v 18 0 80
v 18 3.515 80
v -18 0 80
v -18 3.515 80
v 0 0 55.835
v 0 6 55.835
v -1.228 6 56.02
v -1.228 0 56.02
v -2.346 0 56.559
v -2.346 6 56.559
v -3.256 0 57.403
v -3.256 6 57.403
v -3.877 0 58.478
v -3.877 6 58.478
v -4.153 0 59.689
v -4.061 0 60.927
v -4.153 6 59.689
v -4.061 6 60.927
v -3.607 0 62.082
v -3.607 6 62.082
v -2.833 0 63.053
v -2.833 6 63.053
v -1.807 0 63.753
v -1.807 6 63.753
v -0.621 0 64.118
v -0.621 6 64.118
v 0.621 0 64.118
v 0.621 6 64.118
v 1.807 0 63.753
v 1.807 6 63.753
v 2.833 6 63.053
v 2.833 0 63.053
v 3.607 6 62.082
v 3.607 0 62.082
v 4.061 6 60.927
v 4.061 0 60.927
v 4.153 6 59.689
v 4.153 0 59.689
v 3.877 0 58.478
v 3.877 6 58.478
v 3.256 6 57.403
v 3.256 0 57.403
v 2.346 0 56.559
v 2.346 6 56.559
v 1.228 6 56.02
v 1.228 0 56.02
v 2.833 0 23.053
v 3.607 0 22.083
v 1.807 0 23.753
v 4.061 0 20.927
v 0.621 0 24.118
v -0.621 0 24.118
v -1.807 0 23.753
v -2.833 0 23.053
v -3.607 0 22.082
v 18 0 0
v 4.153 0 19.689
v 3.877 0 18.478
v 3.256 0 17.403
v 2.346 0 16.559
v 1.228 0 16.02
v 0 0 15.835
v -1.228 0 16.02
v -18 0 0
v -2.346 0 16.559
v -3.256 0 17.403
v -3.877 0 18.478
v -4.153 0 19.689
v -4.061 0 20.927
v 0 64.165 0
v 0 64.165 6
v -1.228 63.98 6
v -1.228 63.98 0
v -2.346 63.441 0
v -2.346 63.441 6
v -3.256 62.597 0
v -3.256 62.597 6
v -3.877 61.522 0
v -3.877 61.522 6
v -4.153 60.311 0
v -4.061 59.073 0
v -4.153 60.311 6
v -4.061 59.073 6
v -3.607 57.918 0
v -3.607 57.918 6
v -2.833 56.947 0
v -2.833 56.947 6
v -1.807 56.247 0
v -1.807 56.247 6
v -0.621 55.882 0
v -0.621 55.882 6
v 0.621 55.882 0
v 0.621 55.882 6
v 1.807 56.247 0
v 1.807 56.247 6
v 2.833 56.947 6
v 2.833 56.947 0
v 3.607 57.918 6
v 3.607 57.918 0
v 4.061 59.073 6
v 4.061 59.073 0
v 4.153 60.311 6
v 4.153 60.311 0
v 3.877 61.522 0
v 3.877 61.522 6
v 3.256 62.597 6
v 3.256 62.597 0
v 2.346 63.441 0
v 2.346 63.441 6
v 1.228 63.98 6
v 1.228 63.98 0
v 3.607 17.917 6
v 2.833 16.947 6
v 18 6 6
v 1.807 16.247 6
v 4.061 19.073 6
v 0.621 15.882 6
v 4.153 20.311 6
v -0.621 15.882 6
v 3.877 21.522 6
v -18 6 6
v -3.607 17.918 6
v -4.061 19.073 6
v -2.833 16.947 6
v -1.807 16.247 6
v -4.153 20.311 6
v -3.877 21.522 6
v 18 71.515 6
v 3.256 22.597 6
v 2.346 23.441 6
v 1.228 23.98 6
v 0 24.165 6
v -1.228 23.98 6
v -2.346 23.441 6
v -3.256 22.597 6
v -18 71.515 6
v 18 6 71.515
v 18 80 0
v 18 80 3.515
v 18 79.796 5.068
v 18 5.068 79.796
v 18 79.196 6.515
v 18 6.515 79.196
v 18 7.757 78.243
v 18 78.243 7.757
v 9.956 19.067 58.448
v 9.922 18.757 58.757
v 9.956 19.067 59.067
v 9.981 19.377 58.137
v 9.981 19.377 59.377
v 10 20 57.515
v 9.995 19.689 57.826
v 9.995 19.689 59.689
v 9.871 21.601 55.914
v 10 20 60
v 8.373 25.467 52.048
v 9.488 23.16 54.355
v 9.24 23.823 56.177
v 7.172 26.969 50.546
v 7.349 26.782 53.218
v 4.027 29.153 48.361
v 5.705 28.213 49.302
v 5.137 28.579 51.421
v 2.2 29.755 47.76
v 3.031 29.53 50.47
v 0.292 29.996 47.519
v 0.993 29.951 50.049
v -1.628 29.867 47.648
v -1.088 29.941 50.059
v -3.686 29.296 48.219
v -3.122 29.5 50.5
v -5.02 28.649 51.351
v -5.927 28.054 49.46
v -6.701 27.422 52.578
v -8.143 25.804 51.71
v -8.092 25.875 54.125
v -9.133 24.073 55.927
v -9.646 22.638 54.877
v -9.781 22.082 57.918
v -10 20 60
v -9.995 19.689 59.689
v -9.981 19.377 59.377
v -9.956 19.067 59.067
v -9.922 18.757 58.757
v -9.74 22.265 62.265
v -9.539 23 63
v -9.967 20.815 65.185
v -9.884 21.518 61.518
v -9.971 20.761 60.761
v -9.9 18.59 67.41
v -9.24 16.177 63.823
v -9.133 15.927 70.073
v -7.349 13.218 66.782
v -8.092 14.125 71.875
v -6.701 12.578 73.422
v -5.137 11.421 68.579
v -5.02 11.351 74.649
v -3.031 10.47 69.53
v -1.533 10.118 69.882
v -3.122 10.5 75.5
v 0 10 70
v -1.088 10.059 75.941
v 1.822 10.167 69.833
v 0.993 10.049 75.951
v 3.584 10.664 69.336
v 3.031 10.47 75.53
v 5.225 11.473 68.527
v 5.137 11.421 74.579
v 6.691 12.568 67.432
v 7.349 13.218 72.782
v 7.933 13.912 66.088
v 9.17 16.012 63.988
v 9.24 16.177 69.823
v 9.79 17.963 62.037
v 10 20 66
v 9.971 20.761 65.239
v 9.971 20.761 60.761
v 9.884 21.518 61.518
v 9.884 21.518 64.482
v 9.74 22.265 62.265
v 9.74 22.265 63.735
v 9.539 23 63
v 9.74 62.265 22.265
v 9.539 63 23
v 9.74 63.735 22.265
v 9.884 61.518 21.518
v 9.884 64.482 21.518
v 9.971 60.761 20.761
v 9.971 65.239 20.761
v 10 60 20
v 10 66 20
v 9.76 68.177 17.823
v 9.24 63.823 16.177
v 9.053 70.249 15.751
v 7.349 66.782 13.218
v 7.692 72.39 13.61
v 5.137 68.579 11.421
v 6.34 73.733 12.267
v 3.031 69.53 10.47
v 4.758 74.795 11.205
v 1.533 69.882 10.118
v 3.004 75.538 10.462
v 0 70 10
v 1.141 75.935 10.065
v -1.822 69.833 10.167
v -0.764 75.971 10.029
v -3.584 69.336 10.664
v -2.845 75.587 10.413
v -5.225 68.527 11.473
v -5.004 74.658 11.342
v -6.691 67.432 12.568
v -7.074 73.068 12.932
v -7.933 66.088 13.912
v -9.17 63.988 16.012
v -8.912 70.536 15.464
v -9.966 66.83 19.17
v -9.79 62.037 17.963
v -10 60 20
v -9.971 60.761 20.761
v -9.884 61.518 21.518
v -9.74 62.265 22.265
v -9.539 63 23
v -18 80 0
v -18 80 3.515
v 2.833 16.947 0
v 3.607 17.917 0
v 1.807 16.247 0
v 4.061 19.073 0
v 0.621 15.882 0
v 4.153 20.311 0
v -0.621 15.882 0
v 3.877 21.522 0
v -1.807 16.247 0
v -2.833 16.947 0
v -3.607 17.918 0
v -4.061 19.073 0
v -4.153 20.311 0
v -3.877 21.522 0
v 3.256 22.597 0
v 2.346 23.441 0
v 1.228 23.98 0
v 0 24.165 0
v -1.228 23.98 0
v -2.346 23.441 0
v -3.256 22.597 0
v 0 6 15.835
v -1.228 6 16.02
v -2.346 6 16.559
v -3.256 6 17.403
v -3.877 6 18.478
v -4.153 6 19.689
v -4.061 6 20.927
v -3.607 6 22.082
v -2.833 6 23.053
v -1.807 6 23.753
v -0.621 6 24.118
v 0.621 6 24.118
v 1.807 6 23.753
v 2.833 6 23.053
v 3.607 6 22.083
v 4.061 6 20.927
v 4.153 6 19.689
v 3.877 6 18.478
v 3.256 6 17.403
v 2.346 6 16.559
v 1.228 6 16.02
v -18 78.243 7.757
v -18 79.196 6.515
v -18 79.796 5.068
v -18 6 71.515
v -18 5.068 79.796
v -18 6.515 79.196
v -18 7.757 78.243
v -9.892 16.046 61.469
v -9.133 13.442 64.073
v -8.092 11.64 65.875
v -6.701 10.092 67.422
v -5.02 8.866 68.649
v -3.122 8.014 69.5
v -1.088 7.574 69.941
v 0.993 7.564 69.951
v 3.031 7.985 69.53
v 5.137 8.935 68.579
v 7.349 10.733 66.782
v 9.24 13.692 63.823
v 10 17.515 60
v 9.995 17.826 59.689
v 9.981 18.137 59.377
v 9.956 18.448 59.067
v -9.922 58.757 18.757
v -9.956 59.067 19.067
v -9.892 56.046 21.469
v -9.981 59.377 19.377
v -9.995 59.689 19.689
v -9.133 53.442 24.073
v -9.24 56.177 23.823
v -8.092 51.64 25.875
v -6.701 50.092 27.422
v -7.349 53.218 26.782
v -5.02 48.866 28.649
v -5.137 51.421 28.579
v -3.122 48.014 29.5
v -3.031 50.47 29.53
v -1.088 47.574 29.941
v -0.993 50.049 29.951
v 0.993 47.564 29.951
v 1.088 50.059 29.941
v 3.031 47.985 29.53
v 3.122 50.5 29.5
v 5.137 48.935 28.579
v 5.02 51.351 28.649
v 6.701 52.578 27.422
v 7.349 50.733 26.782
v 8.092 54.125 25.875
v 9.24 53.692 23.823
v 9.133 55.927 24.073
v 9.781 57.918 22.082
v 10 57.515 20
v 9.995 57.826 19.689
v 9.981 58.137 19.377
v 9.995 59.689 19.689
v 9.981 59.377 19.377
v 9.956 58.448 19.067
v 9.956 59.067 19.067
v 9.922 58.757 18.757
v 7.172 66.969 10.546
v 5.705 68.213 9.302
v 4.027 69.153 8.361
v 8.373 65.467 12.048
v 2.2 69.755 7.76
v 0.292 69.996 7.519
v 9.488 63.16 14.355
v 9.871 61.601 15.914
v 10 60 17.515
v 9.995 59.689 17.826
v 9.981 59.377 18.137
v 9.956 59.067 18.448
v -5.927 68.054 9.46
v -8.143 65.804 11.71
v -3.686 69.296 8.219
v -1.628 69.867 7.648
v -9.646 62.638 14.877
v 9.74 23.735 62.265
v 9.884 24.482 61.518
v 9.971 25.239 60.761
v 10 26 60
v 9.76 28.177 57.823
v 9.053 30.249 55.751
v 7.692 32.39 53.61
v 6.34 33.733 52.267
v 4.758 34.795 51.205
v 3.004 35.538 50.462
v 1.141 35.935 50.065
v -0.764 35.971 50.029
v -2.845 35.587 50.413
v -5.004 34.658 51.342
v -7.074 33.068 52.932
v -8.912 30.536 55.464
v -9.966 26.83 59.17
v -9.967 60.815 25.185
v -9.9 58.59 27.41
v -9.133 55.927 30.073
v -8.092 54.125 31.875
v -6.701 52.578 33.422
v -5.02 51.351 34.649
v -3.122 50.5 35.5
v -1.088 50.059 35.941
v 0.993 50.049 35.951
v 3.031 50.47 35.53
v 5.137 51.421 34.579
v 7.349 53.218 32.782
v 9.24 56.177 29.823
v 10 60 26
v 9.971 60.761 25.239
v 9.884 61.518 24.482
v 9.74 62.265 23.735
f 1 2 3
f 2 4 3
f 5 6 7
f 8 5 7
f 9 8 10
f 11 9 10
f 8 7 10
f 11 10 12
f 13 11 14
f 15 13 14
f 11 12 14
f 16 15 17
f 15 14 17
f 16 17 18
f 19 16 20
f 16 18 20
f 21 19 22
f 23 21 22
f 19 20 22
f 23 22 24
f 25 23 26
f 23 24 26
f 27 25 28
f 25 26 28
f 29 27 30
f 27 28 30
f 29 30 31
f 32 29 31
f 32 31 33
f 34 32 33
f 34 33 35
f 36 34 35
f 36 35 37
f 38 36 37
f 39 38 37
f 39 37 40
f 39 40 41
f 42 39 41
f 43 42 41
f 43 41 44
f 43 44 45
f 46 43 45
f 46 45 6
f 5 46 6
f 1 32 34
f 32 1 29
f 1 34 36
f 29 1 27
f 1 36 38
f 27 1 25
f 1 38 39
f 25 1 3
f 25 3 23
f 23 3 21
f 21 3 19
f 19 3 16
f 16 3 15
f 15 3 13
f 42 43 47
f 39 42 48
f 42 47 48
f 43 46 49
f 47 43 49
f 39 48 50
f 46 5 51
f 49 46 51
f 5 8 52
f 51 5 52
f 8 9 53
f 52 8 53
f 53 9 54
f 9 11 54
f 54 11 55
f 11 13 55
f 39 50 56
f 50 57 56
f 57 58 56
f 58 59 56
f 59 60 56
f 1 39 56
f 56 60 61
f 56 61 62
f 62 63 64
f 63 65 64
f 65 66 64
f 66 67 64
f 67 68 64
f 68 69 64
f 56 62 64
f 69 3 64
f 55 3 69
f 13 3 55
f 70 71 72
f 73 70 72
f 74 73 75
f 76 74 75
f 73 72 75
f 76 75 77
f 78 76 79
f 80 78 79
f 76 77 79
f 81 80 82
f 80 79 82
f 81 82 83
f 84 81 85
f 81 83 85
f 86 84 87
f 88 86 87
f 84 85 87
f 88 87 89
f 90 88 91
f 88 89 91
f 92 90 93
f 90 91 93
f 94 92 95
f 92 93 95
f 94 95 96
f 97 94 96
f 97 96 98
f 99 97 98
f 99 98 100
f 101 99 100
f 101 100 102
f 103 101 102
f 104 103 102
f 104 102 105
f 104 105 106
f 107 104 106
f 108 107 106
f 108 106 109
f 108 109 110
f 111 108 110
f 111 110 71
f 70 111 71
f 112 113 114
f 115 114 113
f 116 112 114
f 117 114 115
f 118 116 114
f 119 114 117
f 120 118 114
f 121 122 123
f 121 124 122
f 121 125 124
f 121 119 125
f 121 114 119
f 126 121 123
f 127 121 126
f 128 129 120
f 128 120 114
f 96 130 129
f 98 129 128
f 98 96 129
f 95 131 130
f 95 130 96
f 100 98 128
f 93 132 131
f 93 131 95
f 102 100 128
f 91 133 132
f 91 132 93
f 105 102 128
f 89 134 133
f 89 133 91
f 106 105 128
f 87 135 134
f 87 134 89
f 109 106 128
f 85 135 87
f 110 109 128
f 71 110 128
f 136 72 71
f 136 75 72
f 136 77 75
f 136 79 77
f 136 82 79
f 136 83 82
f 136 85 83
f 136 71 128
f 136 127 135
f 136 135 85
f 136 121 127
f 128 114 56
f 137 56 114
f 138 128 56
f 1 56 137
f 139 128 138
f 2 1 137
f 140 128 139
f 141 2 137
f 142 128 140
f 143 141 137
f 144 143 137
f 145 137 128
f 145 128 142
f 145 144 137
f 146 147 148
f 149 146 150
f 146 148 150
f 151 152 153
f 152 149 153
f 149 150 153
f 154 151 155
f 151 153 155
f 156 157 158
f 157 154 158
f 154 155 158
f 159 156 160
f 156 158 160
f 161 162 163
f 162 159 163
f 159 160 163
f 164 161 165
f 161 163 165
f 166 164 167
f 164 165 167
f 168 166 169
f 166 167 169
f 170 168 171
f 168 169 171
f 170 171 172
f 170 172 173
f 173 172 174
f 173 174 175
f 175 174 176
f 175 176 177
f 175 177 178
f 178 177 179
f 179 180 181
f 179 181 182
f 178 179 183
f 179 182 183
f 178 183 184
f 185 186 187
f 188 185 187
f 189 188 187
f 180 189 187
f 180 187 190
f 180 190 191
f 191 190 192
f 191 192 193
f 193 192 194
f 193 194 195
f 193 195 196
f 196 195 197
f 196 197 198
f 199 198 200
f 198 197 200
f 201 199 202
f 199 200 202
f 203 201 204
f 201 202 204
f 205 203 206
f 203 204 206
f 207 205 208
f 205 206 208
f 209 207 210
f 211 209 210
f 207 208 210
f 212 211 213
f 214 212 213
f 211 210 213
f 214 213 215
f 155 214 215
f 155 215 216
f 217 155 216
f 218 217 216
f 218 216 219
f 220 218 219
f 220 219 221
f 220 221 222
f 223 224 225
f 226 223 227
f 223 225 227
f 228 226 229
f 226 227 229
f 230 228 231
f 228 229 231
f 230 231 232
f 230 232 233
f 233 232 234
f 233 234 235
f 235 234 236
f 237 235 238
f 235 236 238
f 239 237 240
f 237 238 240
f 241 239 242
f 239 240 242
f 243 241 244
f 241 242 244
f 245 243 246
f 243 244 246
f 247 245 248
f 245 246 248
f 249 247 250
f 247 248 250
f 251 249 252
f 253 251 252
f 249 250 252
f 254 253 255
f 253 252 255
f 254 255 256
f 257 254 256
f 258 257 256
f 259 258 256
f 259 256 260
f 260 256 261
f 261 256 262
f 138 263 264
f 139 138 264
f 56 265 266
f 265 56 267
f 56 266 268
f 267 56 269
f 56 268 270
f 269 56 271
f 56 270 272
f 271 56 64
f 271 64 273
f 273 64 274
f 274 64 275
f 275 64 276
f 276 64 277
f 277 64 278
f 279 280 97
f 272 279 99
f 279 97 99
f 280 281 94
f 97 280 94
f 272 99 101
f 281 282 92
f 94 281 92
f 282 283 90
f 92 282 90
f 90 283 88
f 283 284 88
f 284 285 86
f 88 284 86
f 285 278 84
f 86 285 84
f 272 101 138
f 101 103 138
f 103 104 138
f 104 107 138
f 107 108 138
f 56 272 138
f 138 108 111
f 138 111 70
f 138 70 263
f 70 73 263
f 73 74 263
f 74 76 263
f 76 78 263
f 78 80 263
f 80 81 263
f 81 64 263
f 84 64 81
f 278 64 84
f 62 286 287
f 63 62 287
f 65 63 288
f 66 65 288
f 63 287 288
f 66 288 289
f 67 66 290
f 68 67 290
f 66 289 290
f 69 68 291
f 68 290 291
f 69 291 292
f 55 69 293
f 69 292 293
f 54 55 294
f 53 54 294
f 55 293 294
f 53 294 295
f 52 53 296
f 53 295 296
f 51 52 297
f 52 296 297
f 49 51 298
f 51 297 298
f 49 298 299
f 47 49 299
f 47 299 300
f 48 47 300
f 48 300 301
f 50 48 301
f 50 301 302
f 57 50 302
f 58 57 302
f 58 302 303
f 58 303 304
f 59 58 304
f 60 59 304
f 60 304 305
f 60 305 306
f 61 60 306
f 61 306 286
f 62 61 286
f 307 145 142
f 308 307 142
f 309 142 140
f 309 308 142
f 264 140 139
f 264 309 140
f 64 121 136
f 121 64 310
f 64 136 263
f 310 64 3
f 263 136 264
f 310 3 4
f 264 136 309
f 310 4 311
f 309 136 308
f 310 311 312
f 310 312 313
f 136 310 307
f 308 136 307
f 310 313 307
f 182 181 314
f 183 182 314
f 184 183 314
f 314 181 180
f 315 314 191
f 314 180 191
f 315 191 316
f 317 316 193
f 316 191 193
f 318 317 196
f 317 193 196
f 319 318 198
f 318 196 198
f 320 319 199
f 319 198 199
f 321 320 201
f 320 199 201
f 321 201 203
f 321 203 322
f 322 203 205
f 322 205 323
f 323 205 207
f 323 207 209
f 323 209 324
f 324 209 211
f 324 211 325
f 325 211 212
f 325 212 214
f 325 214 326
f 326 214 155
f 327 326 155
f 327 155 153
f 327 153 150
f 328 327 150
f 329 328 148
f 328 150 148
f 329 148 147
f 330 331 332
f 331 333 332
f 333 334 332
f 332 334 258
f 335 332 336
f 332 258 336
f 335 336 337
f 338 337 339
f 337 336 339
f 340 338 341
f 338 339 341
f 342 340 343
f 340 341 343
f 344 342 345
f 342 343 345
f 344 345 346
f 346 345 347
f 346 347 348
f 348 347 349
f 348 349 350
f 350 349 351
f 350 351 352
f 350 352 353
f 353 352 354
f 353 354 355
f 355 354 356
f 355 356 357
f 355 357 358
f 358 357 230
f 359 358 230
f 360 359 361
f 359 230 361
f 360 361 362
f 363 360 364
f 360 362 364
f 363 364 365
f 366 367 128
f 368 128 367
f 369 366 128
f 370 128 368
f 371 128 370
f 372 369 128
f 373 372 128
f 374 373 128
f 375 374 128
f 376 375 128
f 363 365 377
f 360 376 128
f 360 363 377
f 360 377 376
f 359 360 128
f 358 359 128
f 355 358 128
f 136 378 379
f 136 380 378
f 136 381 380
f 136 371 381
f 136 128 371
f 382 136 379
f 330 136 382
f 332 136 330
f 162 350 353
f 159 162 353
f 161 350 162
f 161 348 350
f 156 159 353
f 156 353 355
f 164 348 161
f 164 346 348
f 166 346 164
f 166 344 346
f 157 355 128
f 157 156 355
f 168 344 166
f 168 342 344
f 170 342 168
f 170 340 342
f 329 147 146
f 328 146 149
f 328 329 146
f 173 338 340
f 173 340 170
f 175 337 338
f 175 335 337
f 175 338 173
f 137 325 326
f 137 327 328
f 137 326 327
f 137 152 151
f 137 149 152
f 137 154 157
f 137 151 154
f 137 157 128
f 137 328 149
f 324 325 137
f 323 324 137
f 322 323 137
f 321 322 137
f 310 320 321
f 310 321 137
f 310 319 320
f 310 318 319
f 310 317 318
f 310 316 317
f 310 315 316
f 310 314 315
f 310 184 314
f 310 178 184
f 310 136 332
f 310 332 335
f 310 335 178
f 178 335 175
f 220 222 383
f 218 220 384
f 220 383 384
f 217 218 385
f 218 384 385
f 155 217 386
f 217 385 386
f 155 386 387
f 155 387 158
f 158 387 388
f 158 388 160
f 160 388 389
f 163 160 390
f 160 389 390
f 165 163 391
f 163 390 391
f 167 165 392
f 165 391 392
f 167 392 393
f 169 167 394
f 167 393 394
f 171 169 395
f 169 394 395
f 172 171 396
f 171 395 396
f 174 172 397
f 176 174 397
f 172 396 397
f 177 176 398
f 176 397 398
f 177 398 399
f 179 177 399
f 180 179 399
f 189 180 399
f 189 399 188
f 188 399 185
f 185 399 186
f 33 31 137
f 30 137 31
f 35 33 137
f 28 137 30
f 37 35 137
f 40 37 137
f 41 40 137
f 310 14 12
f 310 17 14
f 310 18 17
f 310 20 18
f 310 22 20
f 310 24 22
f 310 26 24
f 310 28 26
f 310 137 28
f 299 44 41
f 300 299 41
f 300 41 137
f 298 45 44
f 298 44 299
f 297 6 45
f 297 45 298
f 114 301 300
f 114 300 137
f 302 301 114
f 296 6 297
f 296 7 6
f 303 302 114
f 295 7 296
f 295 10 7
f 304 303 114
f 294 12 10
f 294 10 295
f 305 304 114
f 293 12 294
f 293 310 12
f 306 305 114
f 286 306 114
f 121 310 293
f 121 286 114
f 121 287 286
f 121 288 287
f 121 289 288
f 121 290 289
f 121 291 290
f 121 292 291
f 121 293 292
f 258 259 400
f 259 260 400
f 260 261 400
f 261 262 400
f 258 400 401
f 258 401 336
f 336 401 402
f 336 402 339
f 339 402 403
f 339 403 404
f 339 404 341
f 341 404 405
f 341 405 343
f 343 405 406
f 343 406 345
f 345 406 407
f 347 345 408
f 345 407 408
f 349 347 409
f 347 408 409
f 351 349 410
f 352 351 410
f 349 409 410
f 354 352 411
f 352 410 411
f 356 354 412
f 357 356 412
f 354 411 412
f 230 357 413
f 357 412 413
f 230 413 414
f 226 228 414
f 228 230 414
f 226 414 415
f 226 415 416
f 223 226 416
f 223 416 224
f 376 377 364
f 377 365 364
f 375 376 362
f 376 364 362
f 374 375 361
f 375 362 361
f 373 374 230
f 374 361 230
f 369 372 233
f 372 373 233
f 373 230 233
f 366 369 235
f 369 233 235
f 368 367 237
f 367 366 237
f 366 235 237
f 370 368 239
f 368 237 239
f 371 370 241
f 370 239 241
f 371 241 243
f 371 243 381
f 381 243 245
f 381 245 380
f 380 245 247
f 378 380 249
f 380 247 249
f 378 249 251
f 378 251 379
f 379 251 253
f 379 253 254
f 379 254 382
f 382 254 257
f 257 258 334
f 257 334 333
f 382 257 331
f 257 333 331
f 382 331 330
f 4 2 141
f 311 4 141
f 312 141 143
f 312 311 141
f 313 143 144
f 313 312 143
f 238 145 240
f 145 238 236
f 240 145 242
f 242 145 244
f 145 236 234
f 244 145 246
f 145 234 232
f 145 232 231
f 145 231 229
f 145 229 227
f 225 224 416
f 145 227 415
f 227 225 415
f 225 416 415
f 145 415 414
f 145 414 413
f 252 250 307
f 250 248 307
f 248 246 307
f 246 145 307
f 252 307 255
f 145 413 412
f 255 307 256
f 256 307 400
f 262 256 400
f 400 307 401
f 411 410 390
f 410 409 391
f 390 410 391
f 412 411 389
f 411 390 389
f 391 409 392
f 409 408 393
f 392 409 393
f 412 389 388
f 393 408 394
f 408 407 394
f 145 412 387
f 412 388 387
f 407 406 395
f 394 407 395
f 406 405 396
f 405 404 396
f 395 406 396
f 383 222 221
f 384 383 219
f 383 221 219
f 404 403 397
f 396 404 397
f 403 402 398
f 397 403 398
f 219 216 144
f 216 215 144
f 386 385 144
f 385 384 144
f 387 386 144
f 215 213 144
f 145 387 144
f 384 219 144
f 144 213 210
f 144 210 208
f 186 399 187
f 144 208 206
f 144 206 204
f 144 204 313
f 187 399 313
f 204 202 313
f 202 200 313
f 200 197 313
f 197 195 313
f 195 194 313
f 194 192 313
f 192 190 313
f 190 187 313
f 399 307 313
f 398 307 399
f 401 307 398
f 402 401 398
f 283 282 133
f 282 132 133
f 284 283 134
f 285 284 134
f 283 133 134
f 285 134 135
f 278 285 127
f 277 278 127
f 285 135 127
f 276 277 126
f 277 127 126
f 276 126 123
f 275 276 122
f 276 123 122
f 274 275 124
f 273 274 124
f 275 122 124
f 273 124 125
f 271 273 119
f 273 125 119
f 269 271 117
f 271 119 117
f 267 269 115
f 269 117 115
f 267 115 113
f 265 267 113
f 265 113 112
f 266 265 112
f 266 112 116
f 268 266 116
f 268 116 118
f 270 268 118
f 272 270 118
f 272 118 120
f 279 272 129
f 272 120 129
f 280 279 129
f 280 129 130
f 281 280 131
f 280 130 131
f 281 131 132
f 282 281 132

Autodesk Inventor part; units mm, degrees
ref_plane "YZ Plane" through (0, 0, 0) normal (1, 0, 0) x (0, 1, 0)
ref_plane "XZ Plane" through (0, 0, 0) normal (0, 1, 0) x (-1, 0, 0)
ref_plane "XY Plane" through (0, 0, 0) normal (0, 0, 1) x (1, 0, 0)
sketch "Sketch_1" plane through (0, 0, 0) normal (1, 0, 0) x (0, 1, 0)
  line L0 (3.5147, 80) -> (0, 80)
  line L1 (0, 80) -> (0, 0)
  line L2 (0, 0) -> (80, 0)
  line L3 (80, 0) -> (80, 3.5147)
  arc A0 (80, 3.5147) -> (78.2426, 7.7574) centre (74, 3.5147) ccw
  line L4 (78.2426, 7.7574) -> (7.7574, 78.2426)
  arc A1 (7.7574, 78.2426) -> (3.5147, 80) centre (3.5147, 74) ccw
  line L5 (6, 71.5147) -> (6, 6)
  line L6 (6, 6) -> (71.5147, 6)
  line L7 (71.5147, 6) -> (6, 71.5147)
extrude "Extrusion1" add sketch "Sketch_1" along normal mid plane 36
sketch "Sketch2" plane through (-18, 0, 0) normal (0, -1, 0) x (1, 0, 0)
  point P0 (18, 20)
hole "Hole1" at (0, 0, 20) direction (0, 1, 0) diameter 8.33 depth 6
sketch "Sketch3" plane through (18, 80, 0) normal (0, 0, -1) x (-1, 0, 0)
  point P0 (18, -60)
hole "Hole2" at (0, 20, 0) direction (0, 0, 1) diameter 8.33 depth 6
sketch "Sketch_4" plane through (0, 0, 80) normal (0, 0, 1) x (1, 0, 0)
  circle A0 centre (0, 20) radius 10
extrude "Extrusion2" cut sketch "Sketch_4" against normal blind 74
sketch "Sketch_5" plane through (0, 80, 0) normal (0, 1, 0) x (1, 0, 0)
  circle A0 centre (0, -20) radius 10
extrude "Extrusion3" cut sketch "Sketch_5" against normal blind 74
sketch "Sketch6" plane through (18, 80, 0) normal (0, 0, -1) x (-1, 0, 0)
  point P0 (18, -20)
hole "Hole3" at (0, 60, 0) direction (0, 0, 1) diameter 8.33 depth 6
sketch "Sketch7" plane through (-18, 0, 0) normal (0, -1, 0) x (1, 0, 0)
  point P0 (18, 60)
hole "Hole4" at (0, 0, 60) direction (0, 1, 0) diameter 8.33 depth 6
sketch "Sketch_8" plane through (0, 0, 80) normal (0, 0, 1) x (1, 0, 0)
  circle A0 centre (0, 60) radius 10
extrude "Extrusion4" cut sketch "Sketch_8" against normal blind 74
sketch "Sketch_9" plane through (0, 80, 0) normal (0, 1, 0) x (1, 0, 0)
  circle A0 centre (0, -60) radius 10
extrude "Extrusion5" cut sketch "Sketch_9" against normal blind 74
properties part number "40-4336 Aluminum"
